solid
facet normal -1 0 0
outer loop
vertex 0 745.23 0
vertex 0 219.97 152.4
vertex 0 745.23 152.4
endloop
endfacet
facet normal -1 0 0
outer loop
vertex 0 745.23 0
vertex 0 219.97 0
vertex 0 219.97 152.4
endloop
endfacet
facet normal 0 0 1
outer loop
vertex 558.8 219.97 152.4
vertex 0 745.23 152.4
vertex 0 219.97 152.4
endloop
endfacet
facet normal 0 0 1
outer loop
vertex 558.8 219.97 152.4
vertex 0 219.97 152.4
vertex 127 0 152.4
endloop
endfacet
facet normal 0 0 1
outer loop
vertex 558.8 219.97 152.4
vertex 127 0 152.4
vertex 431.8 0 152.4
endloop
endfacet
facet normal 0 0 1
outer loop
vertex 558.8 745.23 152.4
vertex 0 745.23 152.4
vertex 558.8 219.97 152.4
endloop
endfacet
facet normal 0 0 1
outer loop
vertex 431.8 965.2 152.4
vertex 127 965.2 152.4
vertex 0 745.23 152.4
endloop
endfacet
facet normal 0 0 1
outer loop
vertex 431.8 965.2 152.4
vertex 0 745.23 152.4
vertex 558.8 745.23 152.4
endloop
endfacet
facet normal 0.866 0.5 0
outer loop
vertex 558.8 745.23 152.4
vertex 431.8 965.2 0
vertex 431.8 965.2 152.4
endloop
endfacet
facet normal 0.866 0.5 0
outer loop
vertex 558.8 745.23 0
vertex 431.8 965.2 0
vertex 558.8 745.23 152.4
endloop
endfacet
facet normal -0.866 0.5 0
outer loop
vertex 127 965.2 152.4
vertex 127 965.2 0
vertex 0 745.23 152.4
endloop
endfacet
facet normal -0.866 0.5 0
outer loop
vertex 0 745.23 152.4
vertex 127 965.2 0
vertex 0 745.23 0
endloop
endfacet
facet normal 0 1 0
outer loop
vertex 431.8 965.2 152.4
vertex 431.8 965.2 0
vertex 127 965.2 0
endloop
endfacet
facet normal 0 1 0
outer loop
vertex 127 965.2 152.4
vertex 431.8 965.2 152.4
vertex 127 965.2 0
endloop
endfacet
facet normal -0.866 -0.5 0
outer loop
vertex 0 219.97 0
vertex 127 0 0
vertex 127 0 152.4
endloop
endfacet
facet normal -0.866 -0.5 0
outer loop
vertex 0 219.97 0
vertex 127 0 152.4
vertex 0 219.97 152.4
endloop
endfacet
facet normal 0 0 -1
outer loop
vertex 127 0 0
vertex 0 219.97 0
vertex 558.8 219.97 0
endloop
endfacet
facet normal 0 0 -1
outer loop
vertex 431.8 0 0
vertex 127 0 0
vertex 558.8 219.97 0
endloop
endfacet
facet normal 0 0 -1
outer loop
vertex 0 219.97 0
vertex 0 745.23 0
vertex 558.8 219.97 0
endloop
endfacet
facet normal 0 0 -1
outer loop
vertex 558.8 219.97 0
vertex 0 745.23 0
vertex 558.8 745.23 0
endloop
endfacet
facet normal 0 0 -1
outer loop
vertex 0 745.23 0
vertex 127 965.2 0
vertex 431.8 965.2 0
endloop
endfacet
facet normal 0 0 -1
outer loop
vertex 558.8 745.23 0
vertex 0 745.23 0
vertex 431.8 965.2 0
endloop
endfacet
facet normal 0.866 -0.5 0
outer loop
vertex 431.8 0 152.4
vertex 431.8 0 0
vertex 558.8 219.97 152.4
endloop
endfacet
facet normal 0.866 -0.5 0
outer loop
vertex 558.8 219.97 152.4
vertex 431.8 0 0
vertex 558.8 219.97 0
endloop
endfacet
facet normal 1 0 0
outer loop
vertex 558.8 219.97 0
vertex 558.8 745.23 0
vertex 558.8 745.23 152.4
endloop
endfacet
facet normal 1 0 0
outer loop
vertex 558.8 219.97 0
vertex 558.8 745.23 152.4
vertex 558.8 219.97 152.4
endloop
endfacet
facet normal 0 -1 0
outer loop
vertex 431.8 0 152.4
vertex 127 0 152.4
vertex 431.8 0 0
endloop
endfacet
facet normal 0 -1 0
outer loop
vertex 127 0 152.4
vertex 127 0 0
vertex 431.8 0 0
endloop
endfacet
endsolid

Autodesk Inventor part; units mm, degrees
ref_plane "YZ Plane" through (0, 0, 0) normal (1, 0, 0) x (0, 1, 0)
ref_plane "XZ Plane" through (0, 0, 0) normal (0, 1, 0) x (-1, 0, 0)
ref_plane "XY Plane" through (0, 0, 0) normal (0, 0, 1) x (1, 0, 0)
sketch "Sketch1" plane through (0, 0, 0) normal (0, 0, 1) x (1, 0, 0)
  point P0 (0, 0)
sketch "Sketch2" plane through (0, 0, 0) normal (0, 0, 1) x (1, 0, 0)
  line L0 (127, 965.2) -> (341.7889, 965.2) construction
  line L1 (279.4, 965.2) -> (279.4, 0) construction
  line L2 (279.4, 482.6) -> (-286.2053, 482.6) construction
  line L3 (127, 965.2) -> (0, 745.2295)
  line L4 (431.8, 965.2) -> (558.8, 745.2295)
  line L5 (127, 0) -> (0, 219.9705)
  line L6 (431.8, 0) -> (558.8, 219.9705)
  line L7 (0, 219.9705) -> (0, 745.2295)
  line L8 (558.8, 745.2295) -> (558.8, 219.9705)
  line L9 (0, 745.2295) -> (127, 965.2)
  line L10 (0, 745.2295) -> (0, 219.9705)
  line L11 (0, 219.9705) -> (127, 0)
  line L12 (431.8, 0) -> (558.8, 219.9705)
  line L13 (558.8, 219.9705) -> (558.8, 745.2295)
  line L14 (558.8, 745.2295) -> (431.8, 965.2)
  line L15 (127, 0) -> (431.8, 0)
  line L16 (431.8, 965.2) -> (127, 965.2)
  point P0 (0, 0)
  point P1 (341.7889, 0)
  dimension "d3" = 152.4
  dimension "d4" = 152.4
  dimension "d10" = 525.2591
  dimension "d11" = 525.2591
  dimension "d15" = 304.8
  dimension "d16" = 219.9704
extrude "Extrusion1" add sketch "Sketch2" along normal blind 152.4
properties part number "4901BaseSolidGeometry"
